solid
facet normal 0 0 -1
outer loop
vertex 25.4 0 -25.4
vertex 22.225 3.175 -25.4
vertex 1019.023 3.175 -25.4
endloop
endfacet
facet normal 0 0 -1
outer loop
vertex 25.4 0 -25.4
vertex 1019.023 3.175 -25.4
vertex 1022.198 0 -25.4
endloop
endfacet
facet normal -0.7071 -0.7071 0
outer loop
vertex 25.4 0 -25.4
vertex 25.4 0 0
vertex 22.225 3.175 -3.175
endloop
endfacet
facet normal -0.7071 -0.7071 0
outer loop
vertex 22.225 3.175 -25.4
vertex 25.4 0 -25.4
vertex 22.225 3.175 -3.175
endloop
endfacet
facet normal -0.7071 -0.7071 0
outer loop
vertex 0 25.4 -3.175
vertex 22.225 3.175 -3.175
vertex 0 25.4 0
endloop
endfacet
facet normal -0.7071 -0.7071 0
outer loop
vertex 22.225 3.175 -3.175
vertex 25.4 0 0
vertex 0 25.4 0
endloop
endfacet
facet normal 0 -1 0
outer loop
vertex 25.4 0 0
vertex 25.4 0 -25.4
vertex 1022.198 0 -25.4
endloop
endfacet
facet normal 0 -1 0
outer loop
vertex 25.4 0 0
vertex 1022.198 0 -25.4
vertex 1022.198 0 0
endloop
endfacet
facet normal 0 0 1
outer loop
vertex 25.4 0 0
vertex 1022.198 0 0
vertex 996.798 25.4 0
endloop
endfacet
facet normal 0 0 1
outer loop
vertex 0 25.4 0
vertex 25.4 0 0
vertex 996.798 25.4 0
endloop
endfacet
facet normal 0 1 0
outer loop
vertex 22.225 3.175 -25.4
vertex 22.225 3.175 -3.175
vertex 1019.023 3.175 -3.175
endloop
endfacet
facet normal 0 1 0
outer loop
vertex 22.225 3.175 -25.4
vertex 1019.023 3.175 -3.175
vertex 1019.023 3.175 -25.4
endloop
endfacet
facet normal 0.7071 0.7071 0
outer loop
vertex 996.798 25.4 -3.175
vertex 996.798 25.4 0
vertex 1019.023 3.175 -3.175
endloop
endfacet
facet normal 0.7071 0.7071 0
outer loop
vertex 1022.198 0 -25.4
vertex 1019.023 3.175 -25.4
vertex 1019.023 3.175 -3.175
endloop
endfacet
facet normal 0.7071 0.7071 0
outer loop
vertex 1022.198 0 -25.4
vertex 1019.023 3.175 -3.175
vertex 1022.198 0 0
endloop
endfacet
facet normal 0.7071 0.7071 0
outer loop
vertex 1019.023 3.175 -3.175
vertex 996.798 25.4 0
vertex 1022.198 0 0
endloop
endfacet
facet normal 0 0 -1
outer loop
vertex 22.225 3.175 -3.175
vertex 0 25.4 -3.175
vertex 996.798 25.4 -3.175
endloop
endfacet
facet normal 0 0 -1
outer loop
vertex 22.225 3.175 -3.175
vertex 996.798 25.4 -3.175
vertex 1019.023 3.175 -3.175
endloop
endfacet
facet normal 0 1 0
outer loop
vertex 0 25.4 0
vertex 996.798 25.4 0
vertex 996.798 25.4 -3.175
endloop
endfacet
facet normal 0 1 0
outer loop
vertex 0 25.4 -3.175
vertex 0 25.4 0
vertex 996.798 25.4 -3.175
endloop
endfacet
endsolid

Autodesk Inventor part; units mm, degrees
ref_plane "YZ Plane" through (0, 0, 0) normal (1, 0, 0) x (0, 1, 0)
ref_plane "XZ Plane" through (0, 0, 0) normal (0, 1, 0) x (-1, 0, 0)
ref_plane "XY Plane" through (0, 0, 0) normal (0, 0, 1) x (1, 0, 0)
sketch "Sketch1" plane through (0, 0, 0) normal (1, 0, 0) x (0, 1, 0)
  line L0 (0, 0) -> (25.4, 0)
  line L1 (25.4, 0) -> (25.4, -3.175)
  line L2 (25.4, -3.175) -> (3.175, -3.175)
  line L3 (3.175, -3.175) -> (3.175, -25.4)
  line L4 (3.175, -25.4) -> (0, -25.4)
  line L5 (0, -25.4) -> (0, 0)
  dimension "d0" = 25.4
  dimension "d1" = 3.175
  dimension "d2" = 22.225
  dimension "d3" = 22.225
  dimension "d4" = 3.175
extrude "Extrusion1" add sketch "Sketch1" along normal blind 1022.1976
sketch "Sketch3" plane through (0, 0, 0) normal (0, 0, 1) x (1, 0, 0)
  line L0 (1022.1976, 0) -> (1022.1976, 25.4)
  line L1 (1022.1976, 25.4) -> (996.7976, 25.4)
  line L2 (996.7976, 25.4) -> (1022.1976, 0)
  line L3 (0, 25.4) -> (0, 0)
  line L4 (0, 0) -> (0, 25.4) projected
  line L5 (0, 0) -> (25.4, 0)
  line L6 (25.4, 0) -> (0, 25.4)
  dimension "d11" = 25.4
  dimension "d12" = 25.4
  dimension "d13" = 45
extrude "Extrusion3" cut sketch "Sketch3" against normal blind 1022.1976
properties part number "Brace Back 45"
